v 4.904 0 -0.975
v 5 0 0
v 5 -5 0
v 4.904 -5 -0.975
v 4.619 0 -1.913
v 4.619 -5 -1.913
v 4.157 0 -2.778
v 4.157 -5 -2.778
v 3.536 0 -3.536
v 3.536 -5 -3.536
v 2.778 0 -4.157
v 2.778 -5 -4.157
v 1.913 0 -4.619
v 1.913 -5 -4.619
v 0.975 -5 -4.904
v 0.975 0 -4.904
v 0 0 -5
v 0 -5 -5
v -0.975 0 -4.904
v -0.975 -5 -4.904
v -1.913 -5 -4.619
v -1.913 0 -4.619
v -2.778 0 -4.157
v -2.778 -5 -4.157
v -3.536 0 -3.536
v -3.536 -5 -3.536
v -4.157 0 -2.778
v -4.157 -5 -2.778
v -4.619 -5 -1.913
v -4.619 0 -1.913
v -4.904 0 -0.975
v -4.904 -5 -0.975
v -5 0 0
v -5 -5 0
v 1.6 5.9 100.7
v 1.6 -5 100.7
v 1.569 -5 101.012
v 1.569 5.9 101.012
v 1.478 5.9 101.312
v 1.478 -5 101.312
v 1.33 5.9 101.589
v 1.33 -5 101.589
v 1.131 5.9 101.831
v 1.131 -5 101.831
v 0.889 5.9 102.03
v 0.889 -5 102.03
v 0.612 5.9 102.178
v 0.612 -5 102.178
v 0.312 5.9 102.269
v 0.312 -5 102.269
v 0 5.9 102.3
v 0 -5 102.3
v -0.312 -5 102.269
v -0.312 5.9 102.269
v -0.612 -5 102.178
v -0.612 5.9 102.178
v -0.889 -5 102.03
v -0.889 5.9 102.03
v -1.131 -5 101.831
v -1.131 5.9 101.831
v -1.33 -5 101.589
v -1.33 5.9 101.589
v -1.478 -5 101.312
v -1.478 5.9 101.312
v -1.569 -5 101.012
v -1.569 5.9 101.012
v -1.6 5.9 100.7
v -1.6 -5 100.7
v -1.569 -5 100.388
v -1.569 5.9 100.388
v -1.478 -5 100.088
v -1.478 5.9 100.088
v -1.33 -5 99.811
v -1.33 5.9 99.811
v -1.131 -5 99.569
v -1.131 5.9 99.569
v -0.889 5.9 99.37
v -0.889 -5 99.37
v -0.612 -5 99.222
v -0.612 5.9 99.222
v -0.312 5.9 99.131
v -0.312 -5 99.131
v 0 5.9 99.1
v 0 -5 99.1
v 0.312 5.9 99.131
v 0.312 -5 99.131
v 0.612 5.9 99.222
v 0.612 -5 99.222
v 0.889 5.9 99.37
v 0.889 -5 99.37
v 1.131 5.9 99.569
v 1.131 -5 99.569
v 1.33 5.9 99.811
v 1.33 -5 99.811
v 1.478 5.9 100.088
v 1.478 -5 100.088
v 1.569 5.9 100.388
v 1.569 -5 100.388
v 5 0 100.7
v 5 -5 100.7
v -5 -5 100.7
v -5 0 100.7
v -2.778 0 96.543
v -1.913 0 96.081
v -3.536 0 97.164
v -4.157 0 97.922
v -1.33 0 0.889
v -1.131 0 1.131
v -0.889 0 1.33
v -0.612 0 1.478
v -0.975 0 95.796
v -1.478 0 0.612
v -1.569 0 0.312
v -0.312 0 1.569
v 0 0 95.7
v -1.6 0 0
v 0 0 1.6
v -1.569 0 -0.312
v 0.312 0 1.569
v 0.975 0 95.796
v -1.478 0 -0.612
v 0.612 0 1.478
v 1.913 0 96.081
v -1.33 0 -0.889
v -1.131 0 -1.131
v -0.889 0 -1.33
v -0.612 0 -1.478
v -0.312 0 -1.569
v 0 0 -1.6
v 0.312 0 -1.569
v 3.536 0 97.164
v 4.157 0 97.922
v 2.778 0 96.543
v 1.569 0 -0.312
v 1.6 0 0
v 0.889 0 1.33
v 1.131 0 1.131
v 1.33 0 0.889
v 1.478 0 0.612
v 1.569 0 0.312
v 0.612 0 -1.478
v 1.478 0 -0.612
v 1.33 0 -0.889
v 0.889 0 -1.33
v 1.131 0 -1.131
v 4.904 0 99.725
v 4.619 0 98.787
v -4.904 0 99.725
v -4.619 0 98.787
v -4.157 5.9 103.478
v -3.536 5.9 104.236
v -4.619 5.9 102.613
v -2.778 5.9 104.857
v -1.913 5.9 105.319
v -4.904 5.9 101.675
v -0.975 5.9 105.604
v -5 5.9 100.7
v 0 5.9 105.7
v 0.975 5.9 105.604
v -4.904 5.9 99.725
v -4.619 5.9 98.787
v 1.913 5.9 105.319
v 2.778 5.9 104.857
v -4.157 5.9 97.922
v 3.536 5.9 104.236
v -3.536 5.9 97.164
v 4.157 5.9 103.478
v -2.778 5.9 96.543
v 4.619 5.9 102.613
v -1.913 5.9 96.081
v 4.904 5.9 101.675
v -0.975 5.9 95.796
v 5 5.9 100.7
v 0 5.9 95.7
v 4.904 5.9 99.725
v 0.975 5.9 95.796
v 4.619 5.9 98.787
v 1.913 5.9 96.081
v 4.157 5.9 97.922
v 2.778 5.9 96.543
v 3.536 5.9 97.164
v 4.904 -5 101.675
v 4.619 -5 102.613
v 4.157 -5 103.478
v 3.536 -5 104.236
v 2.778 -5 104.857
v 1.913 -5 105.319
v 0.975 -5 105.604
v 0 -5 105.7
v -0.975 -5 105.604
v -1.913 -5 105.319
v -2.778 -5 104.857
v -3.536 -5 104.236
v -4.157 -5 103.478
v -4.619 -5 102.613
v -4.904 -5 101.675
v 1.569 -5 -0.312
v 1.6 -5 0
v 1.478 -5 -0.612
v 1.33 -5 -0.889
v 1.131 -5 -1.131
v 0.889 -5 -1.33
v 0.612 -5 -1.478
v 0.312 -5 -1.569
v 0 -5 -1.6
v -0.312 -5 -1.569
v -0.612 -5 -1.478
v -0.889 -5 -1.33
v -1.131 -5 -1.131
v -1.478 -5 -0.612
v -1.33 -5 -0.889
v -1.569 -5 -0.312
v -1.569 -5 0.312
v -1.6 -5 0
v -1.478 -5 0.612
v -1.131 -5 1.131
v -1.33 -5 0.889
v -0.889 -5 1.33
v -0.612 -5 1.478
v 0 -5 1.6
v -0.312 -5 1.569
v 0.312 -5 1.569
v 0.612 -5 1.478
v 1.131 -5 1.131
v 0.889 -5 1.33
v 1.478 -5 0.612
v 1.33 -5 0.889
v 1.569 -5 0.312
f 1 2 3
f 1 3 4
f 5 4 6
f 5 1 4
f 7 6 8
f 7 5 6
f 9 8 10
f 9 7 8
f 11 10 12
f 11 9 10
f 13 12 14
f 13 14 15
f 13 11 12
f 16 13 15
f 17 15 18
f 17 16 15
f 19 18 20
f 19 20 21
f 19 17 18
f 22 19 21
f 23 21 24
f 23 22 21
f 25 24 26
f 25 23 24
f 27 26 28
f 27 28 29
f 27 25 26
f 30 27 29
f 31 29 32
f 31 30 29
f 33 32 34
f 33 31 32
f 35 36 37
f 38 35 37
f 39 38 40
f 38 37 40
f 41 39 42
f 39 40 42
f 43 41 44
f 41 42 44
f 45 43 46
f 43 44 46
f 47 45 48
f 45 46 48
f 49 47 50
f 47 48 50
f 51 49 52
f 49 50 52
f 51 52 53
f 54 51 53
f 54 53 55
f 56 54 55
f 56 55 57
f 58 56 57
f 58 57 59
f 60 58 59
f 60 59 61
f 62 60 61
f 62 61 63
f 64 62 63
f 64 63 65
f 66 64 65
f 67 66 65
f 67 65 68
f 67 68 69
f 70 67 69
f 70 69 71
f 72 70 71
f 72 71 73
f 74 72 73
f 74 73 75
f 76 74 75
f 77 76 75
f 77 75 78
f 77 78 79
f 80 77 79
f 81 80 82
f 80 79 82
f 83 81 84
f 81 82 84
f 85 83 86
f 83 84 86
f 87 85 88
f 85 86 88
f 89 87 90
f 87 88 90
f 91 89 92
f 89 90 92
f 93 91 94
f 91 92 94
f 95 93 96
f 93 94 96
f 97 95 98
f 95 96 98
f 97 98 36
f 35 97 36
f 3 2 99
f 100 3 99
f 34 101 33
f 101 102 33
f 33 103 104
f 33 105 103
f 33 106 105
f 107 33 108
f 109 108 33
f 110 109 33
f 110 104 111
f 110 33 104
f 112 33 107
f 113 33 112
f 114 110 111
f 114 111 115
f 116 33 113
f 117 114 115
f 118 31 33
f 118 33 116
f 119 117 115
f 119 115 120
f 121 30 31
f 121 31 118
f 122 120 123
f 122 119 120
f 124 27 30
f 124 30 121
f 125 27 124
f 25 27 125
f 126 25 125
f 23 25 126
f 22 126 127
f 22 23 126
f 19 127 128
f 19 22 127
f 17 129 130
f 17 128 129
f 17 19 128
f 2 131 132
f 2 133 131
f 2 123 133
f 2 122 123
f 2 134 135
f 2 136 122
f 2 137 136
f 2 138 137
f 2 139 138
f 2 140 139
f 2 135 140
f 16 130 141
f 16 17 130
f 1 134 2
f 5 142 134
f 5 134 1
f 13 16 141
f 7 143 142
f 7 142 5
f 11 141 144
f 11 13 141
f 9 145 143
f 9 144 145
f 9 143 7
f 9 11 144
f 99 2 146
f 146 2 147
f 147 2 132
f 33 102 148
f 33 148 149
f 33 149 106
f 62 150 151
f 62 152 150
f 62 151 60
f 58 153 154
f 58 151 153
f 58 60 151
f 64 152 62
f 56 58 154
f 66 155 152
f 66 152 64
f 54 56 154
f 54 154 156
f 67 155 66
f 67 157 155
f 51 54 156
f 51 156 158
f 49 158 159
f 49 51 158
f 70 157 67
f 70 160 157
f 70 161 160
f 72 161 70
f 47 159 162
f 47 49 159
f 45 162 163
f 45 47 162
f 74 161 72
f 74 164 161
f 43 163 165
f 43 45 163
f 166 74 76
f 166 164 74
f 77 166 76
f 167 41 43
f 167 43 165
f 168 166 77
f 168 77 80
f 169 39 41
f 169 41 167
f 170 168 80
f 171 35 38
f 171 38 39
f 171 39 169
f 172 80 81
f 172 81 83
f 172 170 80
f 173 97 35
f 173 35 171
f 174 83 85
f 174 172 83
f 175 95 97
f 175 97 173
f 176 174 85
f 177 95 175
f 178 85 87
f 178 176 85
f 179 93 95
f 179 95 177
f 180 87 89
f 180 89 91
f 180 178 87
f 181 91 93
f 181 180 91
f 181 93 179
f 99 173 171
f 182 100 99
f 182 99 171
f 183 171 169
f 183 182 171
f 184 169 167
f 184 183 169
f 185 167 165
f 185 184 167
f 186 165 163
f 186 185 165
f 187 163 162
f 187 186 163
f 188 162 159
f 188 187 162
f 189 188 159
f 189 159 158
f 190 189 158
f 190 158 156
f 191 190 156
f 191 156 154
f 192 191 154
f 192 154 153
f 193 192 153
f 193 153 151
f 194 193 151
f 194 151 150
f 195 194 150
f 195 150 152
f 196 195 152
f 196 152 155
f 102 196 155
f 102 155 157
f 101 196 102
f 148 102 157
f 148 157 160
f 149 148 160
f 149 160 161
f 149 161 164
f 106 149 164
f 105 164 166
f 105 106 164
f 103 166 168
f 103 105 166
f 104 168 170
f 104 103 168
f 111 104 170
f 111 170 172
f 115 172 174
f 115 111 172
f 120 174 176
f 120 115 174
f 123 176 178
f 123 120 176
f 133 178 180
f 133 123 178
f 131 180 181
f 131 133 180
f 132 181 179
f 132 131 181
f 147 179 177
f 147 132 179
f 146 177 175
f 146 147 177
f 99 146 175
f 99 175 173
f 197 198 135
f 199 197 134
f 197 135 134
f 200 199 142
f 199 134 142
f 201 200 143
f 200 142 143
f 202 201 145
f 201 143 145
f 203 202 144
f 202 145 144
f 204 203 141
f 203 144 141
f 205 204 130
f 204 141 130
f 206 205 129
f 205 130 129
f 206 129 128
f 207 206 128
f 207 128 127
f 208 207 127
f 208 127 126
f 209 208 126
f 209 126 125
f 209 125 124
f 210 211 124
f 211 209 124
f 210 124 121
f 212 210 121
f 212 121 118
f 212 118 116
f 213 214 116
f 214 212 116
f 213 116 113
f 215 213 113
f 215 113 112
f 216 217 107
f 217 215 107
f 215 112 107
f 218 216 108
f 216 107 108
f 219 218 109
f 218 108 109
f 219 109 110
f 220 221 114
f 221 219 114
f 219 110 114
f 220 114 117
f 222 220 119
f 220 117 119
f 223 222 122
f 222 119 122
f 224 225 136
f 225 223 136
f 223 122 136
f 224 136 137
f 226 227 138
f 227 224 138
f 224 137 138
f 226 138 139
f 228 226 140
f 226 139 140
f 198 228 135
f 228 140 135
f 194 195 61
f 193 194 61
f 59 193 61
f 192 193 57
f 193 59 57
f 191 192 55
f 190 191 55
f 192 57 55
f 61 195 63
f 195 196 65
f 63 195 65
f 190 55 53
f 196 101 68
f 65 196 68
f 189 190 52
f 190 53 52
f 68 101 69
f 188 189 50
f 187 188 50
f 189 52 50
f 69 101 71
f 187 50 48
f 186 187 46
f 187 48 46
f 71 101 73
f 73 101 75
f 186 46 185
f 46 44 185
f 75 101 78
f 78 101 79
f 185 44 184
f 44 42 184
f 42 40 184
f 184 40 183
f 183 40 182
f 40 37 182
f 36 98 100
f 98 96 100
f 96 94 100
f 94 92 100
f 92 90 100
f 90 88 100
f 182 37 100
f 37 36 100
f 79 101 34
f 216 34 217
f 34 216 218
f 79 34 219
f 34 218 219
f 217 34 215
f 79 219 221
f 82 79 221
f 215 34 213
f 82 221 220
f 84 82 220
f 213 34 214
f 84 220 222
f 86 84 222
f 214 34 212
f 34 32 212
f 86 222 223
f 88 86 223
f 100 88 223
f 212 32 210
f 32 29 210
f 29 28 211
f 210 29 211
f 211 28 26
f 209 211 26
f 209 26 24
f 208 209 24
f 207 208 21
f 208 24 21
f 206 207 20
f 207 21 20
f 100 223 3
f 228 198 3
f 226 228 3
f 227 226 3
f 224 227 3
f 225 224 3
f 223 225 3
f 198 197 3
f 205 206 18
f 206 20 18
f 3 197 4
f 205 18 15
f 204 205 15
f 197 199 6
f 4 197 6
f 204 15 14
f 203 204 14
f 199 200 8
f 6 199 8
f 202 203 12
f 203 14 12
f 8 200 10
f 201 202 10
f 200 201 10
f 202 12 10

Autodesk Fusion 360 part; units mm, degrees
sketch "Sketch1" plane through (0, 0, 0) normal (0, 1, 0) x (1, 0, 0)
  circle A0 centre (0, 0) radius 5
  circle A1 centre (0, 0) radius 1.6
  line L0 (-5, 0) -> (5, 0)
  line L1 (5, 0) -> (5, -100.7)
  line L2 (5, -100.7) -> (-5, -100.7)
  line L3 (-5, -100.7) -> (-5, 0)
  circle A2 centre (0, -100.7) radius 5
  circle A3 centre (0, -100.7) radius 1.6
  dimension "d1" = 10
  dimension "d2" = 3.2
  dimension "d3" = 100.7
  dimension "d4" = 3.2
extrude "Extrude1" add sketch "Sketch1" along normal blind 5.9 contours L2 A2 A3 | L2 A2 A3
extrude "Extrude2" add sketch "Sketch1" against normal blind 5 contours A0 A1 L0 | A0 L1 L3 A2 | A0 A1 L0 | L2 A2 A3 | L2 A2 A3
equation "d3 = 106 mm - 20.3 mm + 15 mm"
